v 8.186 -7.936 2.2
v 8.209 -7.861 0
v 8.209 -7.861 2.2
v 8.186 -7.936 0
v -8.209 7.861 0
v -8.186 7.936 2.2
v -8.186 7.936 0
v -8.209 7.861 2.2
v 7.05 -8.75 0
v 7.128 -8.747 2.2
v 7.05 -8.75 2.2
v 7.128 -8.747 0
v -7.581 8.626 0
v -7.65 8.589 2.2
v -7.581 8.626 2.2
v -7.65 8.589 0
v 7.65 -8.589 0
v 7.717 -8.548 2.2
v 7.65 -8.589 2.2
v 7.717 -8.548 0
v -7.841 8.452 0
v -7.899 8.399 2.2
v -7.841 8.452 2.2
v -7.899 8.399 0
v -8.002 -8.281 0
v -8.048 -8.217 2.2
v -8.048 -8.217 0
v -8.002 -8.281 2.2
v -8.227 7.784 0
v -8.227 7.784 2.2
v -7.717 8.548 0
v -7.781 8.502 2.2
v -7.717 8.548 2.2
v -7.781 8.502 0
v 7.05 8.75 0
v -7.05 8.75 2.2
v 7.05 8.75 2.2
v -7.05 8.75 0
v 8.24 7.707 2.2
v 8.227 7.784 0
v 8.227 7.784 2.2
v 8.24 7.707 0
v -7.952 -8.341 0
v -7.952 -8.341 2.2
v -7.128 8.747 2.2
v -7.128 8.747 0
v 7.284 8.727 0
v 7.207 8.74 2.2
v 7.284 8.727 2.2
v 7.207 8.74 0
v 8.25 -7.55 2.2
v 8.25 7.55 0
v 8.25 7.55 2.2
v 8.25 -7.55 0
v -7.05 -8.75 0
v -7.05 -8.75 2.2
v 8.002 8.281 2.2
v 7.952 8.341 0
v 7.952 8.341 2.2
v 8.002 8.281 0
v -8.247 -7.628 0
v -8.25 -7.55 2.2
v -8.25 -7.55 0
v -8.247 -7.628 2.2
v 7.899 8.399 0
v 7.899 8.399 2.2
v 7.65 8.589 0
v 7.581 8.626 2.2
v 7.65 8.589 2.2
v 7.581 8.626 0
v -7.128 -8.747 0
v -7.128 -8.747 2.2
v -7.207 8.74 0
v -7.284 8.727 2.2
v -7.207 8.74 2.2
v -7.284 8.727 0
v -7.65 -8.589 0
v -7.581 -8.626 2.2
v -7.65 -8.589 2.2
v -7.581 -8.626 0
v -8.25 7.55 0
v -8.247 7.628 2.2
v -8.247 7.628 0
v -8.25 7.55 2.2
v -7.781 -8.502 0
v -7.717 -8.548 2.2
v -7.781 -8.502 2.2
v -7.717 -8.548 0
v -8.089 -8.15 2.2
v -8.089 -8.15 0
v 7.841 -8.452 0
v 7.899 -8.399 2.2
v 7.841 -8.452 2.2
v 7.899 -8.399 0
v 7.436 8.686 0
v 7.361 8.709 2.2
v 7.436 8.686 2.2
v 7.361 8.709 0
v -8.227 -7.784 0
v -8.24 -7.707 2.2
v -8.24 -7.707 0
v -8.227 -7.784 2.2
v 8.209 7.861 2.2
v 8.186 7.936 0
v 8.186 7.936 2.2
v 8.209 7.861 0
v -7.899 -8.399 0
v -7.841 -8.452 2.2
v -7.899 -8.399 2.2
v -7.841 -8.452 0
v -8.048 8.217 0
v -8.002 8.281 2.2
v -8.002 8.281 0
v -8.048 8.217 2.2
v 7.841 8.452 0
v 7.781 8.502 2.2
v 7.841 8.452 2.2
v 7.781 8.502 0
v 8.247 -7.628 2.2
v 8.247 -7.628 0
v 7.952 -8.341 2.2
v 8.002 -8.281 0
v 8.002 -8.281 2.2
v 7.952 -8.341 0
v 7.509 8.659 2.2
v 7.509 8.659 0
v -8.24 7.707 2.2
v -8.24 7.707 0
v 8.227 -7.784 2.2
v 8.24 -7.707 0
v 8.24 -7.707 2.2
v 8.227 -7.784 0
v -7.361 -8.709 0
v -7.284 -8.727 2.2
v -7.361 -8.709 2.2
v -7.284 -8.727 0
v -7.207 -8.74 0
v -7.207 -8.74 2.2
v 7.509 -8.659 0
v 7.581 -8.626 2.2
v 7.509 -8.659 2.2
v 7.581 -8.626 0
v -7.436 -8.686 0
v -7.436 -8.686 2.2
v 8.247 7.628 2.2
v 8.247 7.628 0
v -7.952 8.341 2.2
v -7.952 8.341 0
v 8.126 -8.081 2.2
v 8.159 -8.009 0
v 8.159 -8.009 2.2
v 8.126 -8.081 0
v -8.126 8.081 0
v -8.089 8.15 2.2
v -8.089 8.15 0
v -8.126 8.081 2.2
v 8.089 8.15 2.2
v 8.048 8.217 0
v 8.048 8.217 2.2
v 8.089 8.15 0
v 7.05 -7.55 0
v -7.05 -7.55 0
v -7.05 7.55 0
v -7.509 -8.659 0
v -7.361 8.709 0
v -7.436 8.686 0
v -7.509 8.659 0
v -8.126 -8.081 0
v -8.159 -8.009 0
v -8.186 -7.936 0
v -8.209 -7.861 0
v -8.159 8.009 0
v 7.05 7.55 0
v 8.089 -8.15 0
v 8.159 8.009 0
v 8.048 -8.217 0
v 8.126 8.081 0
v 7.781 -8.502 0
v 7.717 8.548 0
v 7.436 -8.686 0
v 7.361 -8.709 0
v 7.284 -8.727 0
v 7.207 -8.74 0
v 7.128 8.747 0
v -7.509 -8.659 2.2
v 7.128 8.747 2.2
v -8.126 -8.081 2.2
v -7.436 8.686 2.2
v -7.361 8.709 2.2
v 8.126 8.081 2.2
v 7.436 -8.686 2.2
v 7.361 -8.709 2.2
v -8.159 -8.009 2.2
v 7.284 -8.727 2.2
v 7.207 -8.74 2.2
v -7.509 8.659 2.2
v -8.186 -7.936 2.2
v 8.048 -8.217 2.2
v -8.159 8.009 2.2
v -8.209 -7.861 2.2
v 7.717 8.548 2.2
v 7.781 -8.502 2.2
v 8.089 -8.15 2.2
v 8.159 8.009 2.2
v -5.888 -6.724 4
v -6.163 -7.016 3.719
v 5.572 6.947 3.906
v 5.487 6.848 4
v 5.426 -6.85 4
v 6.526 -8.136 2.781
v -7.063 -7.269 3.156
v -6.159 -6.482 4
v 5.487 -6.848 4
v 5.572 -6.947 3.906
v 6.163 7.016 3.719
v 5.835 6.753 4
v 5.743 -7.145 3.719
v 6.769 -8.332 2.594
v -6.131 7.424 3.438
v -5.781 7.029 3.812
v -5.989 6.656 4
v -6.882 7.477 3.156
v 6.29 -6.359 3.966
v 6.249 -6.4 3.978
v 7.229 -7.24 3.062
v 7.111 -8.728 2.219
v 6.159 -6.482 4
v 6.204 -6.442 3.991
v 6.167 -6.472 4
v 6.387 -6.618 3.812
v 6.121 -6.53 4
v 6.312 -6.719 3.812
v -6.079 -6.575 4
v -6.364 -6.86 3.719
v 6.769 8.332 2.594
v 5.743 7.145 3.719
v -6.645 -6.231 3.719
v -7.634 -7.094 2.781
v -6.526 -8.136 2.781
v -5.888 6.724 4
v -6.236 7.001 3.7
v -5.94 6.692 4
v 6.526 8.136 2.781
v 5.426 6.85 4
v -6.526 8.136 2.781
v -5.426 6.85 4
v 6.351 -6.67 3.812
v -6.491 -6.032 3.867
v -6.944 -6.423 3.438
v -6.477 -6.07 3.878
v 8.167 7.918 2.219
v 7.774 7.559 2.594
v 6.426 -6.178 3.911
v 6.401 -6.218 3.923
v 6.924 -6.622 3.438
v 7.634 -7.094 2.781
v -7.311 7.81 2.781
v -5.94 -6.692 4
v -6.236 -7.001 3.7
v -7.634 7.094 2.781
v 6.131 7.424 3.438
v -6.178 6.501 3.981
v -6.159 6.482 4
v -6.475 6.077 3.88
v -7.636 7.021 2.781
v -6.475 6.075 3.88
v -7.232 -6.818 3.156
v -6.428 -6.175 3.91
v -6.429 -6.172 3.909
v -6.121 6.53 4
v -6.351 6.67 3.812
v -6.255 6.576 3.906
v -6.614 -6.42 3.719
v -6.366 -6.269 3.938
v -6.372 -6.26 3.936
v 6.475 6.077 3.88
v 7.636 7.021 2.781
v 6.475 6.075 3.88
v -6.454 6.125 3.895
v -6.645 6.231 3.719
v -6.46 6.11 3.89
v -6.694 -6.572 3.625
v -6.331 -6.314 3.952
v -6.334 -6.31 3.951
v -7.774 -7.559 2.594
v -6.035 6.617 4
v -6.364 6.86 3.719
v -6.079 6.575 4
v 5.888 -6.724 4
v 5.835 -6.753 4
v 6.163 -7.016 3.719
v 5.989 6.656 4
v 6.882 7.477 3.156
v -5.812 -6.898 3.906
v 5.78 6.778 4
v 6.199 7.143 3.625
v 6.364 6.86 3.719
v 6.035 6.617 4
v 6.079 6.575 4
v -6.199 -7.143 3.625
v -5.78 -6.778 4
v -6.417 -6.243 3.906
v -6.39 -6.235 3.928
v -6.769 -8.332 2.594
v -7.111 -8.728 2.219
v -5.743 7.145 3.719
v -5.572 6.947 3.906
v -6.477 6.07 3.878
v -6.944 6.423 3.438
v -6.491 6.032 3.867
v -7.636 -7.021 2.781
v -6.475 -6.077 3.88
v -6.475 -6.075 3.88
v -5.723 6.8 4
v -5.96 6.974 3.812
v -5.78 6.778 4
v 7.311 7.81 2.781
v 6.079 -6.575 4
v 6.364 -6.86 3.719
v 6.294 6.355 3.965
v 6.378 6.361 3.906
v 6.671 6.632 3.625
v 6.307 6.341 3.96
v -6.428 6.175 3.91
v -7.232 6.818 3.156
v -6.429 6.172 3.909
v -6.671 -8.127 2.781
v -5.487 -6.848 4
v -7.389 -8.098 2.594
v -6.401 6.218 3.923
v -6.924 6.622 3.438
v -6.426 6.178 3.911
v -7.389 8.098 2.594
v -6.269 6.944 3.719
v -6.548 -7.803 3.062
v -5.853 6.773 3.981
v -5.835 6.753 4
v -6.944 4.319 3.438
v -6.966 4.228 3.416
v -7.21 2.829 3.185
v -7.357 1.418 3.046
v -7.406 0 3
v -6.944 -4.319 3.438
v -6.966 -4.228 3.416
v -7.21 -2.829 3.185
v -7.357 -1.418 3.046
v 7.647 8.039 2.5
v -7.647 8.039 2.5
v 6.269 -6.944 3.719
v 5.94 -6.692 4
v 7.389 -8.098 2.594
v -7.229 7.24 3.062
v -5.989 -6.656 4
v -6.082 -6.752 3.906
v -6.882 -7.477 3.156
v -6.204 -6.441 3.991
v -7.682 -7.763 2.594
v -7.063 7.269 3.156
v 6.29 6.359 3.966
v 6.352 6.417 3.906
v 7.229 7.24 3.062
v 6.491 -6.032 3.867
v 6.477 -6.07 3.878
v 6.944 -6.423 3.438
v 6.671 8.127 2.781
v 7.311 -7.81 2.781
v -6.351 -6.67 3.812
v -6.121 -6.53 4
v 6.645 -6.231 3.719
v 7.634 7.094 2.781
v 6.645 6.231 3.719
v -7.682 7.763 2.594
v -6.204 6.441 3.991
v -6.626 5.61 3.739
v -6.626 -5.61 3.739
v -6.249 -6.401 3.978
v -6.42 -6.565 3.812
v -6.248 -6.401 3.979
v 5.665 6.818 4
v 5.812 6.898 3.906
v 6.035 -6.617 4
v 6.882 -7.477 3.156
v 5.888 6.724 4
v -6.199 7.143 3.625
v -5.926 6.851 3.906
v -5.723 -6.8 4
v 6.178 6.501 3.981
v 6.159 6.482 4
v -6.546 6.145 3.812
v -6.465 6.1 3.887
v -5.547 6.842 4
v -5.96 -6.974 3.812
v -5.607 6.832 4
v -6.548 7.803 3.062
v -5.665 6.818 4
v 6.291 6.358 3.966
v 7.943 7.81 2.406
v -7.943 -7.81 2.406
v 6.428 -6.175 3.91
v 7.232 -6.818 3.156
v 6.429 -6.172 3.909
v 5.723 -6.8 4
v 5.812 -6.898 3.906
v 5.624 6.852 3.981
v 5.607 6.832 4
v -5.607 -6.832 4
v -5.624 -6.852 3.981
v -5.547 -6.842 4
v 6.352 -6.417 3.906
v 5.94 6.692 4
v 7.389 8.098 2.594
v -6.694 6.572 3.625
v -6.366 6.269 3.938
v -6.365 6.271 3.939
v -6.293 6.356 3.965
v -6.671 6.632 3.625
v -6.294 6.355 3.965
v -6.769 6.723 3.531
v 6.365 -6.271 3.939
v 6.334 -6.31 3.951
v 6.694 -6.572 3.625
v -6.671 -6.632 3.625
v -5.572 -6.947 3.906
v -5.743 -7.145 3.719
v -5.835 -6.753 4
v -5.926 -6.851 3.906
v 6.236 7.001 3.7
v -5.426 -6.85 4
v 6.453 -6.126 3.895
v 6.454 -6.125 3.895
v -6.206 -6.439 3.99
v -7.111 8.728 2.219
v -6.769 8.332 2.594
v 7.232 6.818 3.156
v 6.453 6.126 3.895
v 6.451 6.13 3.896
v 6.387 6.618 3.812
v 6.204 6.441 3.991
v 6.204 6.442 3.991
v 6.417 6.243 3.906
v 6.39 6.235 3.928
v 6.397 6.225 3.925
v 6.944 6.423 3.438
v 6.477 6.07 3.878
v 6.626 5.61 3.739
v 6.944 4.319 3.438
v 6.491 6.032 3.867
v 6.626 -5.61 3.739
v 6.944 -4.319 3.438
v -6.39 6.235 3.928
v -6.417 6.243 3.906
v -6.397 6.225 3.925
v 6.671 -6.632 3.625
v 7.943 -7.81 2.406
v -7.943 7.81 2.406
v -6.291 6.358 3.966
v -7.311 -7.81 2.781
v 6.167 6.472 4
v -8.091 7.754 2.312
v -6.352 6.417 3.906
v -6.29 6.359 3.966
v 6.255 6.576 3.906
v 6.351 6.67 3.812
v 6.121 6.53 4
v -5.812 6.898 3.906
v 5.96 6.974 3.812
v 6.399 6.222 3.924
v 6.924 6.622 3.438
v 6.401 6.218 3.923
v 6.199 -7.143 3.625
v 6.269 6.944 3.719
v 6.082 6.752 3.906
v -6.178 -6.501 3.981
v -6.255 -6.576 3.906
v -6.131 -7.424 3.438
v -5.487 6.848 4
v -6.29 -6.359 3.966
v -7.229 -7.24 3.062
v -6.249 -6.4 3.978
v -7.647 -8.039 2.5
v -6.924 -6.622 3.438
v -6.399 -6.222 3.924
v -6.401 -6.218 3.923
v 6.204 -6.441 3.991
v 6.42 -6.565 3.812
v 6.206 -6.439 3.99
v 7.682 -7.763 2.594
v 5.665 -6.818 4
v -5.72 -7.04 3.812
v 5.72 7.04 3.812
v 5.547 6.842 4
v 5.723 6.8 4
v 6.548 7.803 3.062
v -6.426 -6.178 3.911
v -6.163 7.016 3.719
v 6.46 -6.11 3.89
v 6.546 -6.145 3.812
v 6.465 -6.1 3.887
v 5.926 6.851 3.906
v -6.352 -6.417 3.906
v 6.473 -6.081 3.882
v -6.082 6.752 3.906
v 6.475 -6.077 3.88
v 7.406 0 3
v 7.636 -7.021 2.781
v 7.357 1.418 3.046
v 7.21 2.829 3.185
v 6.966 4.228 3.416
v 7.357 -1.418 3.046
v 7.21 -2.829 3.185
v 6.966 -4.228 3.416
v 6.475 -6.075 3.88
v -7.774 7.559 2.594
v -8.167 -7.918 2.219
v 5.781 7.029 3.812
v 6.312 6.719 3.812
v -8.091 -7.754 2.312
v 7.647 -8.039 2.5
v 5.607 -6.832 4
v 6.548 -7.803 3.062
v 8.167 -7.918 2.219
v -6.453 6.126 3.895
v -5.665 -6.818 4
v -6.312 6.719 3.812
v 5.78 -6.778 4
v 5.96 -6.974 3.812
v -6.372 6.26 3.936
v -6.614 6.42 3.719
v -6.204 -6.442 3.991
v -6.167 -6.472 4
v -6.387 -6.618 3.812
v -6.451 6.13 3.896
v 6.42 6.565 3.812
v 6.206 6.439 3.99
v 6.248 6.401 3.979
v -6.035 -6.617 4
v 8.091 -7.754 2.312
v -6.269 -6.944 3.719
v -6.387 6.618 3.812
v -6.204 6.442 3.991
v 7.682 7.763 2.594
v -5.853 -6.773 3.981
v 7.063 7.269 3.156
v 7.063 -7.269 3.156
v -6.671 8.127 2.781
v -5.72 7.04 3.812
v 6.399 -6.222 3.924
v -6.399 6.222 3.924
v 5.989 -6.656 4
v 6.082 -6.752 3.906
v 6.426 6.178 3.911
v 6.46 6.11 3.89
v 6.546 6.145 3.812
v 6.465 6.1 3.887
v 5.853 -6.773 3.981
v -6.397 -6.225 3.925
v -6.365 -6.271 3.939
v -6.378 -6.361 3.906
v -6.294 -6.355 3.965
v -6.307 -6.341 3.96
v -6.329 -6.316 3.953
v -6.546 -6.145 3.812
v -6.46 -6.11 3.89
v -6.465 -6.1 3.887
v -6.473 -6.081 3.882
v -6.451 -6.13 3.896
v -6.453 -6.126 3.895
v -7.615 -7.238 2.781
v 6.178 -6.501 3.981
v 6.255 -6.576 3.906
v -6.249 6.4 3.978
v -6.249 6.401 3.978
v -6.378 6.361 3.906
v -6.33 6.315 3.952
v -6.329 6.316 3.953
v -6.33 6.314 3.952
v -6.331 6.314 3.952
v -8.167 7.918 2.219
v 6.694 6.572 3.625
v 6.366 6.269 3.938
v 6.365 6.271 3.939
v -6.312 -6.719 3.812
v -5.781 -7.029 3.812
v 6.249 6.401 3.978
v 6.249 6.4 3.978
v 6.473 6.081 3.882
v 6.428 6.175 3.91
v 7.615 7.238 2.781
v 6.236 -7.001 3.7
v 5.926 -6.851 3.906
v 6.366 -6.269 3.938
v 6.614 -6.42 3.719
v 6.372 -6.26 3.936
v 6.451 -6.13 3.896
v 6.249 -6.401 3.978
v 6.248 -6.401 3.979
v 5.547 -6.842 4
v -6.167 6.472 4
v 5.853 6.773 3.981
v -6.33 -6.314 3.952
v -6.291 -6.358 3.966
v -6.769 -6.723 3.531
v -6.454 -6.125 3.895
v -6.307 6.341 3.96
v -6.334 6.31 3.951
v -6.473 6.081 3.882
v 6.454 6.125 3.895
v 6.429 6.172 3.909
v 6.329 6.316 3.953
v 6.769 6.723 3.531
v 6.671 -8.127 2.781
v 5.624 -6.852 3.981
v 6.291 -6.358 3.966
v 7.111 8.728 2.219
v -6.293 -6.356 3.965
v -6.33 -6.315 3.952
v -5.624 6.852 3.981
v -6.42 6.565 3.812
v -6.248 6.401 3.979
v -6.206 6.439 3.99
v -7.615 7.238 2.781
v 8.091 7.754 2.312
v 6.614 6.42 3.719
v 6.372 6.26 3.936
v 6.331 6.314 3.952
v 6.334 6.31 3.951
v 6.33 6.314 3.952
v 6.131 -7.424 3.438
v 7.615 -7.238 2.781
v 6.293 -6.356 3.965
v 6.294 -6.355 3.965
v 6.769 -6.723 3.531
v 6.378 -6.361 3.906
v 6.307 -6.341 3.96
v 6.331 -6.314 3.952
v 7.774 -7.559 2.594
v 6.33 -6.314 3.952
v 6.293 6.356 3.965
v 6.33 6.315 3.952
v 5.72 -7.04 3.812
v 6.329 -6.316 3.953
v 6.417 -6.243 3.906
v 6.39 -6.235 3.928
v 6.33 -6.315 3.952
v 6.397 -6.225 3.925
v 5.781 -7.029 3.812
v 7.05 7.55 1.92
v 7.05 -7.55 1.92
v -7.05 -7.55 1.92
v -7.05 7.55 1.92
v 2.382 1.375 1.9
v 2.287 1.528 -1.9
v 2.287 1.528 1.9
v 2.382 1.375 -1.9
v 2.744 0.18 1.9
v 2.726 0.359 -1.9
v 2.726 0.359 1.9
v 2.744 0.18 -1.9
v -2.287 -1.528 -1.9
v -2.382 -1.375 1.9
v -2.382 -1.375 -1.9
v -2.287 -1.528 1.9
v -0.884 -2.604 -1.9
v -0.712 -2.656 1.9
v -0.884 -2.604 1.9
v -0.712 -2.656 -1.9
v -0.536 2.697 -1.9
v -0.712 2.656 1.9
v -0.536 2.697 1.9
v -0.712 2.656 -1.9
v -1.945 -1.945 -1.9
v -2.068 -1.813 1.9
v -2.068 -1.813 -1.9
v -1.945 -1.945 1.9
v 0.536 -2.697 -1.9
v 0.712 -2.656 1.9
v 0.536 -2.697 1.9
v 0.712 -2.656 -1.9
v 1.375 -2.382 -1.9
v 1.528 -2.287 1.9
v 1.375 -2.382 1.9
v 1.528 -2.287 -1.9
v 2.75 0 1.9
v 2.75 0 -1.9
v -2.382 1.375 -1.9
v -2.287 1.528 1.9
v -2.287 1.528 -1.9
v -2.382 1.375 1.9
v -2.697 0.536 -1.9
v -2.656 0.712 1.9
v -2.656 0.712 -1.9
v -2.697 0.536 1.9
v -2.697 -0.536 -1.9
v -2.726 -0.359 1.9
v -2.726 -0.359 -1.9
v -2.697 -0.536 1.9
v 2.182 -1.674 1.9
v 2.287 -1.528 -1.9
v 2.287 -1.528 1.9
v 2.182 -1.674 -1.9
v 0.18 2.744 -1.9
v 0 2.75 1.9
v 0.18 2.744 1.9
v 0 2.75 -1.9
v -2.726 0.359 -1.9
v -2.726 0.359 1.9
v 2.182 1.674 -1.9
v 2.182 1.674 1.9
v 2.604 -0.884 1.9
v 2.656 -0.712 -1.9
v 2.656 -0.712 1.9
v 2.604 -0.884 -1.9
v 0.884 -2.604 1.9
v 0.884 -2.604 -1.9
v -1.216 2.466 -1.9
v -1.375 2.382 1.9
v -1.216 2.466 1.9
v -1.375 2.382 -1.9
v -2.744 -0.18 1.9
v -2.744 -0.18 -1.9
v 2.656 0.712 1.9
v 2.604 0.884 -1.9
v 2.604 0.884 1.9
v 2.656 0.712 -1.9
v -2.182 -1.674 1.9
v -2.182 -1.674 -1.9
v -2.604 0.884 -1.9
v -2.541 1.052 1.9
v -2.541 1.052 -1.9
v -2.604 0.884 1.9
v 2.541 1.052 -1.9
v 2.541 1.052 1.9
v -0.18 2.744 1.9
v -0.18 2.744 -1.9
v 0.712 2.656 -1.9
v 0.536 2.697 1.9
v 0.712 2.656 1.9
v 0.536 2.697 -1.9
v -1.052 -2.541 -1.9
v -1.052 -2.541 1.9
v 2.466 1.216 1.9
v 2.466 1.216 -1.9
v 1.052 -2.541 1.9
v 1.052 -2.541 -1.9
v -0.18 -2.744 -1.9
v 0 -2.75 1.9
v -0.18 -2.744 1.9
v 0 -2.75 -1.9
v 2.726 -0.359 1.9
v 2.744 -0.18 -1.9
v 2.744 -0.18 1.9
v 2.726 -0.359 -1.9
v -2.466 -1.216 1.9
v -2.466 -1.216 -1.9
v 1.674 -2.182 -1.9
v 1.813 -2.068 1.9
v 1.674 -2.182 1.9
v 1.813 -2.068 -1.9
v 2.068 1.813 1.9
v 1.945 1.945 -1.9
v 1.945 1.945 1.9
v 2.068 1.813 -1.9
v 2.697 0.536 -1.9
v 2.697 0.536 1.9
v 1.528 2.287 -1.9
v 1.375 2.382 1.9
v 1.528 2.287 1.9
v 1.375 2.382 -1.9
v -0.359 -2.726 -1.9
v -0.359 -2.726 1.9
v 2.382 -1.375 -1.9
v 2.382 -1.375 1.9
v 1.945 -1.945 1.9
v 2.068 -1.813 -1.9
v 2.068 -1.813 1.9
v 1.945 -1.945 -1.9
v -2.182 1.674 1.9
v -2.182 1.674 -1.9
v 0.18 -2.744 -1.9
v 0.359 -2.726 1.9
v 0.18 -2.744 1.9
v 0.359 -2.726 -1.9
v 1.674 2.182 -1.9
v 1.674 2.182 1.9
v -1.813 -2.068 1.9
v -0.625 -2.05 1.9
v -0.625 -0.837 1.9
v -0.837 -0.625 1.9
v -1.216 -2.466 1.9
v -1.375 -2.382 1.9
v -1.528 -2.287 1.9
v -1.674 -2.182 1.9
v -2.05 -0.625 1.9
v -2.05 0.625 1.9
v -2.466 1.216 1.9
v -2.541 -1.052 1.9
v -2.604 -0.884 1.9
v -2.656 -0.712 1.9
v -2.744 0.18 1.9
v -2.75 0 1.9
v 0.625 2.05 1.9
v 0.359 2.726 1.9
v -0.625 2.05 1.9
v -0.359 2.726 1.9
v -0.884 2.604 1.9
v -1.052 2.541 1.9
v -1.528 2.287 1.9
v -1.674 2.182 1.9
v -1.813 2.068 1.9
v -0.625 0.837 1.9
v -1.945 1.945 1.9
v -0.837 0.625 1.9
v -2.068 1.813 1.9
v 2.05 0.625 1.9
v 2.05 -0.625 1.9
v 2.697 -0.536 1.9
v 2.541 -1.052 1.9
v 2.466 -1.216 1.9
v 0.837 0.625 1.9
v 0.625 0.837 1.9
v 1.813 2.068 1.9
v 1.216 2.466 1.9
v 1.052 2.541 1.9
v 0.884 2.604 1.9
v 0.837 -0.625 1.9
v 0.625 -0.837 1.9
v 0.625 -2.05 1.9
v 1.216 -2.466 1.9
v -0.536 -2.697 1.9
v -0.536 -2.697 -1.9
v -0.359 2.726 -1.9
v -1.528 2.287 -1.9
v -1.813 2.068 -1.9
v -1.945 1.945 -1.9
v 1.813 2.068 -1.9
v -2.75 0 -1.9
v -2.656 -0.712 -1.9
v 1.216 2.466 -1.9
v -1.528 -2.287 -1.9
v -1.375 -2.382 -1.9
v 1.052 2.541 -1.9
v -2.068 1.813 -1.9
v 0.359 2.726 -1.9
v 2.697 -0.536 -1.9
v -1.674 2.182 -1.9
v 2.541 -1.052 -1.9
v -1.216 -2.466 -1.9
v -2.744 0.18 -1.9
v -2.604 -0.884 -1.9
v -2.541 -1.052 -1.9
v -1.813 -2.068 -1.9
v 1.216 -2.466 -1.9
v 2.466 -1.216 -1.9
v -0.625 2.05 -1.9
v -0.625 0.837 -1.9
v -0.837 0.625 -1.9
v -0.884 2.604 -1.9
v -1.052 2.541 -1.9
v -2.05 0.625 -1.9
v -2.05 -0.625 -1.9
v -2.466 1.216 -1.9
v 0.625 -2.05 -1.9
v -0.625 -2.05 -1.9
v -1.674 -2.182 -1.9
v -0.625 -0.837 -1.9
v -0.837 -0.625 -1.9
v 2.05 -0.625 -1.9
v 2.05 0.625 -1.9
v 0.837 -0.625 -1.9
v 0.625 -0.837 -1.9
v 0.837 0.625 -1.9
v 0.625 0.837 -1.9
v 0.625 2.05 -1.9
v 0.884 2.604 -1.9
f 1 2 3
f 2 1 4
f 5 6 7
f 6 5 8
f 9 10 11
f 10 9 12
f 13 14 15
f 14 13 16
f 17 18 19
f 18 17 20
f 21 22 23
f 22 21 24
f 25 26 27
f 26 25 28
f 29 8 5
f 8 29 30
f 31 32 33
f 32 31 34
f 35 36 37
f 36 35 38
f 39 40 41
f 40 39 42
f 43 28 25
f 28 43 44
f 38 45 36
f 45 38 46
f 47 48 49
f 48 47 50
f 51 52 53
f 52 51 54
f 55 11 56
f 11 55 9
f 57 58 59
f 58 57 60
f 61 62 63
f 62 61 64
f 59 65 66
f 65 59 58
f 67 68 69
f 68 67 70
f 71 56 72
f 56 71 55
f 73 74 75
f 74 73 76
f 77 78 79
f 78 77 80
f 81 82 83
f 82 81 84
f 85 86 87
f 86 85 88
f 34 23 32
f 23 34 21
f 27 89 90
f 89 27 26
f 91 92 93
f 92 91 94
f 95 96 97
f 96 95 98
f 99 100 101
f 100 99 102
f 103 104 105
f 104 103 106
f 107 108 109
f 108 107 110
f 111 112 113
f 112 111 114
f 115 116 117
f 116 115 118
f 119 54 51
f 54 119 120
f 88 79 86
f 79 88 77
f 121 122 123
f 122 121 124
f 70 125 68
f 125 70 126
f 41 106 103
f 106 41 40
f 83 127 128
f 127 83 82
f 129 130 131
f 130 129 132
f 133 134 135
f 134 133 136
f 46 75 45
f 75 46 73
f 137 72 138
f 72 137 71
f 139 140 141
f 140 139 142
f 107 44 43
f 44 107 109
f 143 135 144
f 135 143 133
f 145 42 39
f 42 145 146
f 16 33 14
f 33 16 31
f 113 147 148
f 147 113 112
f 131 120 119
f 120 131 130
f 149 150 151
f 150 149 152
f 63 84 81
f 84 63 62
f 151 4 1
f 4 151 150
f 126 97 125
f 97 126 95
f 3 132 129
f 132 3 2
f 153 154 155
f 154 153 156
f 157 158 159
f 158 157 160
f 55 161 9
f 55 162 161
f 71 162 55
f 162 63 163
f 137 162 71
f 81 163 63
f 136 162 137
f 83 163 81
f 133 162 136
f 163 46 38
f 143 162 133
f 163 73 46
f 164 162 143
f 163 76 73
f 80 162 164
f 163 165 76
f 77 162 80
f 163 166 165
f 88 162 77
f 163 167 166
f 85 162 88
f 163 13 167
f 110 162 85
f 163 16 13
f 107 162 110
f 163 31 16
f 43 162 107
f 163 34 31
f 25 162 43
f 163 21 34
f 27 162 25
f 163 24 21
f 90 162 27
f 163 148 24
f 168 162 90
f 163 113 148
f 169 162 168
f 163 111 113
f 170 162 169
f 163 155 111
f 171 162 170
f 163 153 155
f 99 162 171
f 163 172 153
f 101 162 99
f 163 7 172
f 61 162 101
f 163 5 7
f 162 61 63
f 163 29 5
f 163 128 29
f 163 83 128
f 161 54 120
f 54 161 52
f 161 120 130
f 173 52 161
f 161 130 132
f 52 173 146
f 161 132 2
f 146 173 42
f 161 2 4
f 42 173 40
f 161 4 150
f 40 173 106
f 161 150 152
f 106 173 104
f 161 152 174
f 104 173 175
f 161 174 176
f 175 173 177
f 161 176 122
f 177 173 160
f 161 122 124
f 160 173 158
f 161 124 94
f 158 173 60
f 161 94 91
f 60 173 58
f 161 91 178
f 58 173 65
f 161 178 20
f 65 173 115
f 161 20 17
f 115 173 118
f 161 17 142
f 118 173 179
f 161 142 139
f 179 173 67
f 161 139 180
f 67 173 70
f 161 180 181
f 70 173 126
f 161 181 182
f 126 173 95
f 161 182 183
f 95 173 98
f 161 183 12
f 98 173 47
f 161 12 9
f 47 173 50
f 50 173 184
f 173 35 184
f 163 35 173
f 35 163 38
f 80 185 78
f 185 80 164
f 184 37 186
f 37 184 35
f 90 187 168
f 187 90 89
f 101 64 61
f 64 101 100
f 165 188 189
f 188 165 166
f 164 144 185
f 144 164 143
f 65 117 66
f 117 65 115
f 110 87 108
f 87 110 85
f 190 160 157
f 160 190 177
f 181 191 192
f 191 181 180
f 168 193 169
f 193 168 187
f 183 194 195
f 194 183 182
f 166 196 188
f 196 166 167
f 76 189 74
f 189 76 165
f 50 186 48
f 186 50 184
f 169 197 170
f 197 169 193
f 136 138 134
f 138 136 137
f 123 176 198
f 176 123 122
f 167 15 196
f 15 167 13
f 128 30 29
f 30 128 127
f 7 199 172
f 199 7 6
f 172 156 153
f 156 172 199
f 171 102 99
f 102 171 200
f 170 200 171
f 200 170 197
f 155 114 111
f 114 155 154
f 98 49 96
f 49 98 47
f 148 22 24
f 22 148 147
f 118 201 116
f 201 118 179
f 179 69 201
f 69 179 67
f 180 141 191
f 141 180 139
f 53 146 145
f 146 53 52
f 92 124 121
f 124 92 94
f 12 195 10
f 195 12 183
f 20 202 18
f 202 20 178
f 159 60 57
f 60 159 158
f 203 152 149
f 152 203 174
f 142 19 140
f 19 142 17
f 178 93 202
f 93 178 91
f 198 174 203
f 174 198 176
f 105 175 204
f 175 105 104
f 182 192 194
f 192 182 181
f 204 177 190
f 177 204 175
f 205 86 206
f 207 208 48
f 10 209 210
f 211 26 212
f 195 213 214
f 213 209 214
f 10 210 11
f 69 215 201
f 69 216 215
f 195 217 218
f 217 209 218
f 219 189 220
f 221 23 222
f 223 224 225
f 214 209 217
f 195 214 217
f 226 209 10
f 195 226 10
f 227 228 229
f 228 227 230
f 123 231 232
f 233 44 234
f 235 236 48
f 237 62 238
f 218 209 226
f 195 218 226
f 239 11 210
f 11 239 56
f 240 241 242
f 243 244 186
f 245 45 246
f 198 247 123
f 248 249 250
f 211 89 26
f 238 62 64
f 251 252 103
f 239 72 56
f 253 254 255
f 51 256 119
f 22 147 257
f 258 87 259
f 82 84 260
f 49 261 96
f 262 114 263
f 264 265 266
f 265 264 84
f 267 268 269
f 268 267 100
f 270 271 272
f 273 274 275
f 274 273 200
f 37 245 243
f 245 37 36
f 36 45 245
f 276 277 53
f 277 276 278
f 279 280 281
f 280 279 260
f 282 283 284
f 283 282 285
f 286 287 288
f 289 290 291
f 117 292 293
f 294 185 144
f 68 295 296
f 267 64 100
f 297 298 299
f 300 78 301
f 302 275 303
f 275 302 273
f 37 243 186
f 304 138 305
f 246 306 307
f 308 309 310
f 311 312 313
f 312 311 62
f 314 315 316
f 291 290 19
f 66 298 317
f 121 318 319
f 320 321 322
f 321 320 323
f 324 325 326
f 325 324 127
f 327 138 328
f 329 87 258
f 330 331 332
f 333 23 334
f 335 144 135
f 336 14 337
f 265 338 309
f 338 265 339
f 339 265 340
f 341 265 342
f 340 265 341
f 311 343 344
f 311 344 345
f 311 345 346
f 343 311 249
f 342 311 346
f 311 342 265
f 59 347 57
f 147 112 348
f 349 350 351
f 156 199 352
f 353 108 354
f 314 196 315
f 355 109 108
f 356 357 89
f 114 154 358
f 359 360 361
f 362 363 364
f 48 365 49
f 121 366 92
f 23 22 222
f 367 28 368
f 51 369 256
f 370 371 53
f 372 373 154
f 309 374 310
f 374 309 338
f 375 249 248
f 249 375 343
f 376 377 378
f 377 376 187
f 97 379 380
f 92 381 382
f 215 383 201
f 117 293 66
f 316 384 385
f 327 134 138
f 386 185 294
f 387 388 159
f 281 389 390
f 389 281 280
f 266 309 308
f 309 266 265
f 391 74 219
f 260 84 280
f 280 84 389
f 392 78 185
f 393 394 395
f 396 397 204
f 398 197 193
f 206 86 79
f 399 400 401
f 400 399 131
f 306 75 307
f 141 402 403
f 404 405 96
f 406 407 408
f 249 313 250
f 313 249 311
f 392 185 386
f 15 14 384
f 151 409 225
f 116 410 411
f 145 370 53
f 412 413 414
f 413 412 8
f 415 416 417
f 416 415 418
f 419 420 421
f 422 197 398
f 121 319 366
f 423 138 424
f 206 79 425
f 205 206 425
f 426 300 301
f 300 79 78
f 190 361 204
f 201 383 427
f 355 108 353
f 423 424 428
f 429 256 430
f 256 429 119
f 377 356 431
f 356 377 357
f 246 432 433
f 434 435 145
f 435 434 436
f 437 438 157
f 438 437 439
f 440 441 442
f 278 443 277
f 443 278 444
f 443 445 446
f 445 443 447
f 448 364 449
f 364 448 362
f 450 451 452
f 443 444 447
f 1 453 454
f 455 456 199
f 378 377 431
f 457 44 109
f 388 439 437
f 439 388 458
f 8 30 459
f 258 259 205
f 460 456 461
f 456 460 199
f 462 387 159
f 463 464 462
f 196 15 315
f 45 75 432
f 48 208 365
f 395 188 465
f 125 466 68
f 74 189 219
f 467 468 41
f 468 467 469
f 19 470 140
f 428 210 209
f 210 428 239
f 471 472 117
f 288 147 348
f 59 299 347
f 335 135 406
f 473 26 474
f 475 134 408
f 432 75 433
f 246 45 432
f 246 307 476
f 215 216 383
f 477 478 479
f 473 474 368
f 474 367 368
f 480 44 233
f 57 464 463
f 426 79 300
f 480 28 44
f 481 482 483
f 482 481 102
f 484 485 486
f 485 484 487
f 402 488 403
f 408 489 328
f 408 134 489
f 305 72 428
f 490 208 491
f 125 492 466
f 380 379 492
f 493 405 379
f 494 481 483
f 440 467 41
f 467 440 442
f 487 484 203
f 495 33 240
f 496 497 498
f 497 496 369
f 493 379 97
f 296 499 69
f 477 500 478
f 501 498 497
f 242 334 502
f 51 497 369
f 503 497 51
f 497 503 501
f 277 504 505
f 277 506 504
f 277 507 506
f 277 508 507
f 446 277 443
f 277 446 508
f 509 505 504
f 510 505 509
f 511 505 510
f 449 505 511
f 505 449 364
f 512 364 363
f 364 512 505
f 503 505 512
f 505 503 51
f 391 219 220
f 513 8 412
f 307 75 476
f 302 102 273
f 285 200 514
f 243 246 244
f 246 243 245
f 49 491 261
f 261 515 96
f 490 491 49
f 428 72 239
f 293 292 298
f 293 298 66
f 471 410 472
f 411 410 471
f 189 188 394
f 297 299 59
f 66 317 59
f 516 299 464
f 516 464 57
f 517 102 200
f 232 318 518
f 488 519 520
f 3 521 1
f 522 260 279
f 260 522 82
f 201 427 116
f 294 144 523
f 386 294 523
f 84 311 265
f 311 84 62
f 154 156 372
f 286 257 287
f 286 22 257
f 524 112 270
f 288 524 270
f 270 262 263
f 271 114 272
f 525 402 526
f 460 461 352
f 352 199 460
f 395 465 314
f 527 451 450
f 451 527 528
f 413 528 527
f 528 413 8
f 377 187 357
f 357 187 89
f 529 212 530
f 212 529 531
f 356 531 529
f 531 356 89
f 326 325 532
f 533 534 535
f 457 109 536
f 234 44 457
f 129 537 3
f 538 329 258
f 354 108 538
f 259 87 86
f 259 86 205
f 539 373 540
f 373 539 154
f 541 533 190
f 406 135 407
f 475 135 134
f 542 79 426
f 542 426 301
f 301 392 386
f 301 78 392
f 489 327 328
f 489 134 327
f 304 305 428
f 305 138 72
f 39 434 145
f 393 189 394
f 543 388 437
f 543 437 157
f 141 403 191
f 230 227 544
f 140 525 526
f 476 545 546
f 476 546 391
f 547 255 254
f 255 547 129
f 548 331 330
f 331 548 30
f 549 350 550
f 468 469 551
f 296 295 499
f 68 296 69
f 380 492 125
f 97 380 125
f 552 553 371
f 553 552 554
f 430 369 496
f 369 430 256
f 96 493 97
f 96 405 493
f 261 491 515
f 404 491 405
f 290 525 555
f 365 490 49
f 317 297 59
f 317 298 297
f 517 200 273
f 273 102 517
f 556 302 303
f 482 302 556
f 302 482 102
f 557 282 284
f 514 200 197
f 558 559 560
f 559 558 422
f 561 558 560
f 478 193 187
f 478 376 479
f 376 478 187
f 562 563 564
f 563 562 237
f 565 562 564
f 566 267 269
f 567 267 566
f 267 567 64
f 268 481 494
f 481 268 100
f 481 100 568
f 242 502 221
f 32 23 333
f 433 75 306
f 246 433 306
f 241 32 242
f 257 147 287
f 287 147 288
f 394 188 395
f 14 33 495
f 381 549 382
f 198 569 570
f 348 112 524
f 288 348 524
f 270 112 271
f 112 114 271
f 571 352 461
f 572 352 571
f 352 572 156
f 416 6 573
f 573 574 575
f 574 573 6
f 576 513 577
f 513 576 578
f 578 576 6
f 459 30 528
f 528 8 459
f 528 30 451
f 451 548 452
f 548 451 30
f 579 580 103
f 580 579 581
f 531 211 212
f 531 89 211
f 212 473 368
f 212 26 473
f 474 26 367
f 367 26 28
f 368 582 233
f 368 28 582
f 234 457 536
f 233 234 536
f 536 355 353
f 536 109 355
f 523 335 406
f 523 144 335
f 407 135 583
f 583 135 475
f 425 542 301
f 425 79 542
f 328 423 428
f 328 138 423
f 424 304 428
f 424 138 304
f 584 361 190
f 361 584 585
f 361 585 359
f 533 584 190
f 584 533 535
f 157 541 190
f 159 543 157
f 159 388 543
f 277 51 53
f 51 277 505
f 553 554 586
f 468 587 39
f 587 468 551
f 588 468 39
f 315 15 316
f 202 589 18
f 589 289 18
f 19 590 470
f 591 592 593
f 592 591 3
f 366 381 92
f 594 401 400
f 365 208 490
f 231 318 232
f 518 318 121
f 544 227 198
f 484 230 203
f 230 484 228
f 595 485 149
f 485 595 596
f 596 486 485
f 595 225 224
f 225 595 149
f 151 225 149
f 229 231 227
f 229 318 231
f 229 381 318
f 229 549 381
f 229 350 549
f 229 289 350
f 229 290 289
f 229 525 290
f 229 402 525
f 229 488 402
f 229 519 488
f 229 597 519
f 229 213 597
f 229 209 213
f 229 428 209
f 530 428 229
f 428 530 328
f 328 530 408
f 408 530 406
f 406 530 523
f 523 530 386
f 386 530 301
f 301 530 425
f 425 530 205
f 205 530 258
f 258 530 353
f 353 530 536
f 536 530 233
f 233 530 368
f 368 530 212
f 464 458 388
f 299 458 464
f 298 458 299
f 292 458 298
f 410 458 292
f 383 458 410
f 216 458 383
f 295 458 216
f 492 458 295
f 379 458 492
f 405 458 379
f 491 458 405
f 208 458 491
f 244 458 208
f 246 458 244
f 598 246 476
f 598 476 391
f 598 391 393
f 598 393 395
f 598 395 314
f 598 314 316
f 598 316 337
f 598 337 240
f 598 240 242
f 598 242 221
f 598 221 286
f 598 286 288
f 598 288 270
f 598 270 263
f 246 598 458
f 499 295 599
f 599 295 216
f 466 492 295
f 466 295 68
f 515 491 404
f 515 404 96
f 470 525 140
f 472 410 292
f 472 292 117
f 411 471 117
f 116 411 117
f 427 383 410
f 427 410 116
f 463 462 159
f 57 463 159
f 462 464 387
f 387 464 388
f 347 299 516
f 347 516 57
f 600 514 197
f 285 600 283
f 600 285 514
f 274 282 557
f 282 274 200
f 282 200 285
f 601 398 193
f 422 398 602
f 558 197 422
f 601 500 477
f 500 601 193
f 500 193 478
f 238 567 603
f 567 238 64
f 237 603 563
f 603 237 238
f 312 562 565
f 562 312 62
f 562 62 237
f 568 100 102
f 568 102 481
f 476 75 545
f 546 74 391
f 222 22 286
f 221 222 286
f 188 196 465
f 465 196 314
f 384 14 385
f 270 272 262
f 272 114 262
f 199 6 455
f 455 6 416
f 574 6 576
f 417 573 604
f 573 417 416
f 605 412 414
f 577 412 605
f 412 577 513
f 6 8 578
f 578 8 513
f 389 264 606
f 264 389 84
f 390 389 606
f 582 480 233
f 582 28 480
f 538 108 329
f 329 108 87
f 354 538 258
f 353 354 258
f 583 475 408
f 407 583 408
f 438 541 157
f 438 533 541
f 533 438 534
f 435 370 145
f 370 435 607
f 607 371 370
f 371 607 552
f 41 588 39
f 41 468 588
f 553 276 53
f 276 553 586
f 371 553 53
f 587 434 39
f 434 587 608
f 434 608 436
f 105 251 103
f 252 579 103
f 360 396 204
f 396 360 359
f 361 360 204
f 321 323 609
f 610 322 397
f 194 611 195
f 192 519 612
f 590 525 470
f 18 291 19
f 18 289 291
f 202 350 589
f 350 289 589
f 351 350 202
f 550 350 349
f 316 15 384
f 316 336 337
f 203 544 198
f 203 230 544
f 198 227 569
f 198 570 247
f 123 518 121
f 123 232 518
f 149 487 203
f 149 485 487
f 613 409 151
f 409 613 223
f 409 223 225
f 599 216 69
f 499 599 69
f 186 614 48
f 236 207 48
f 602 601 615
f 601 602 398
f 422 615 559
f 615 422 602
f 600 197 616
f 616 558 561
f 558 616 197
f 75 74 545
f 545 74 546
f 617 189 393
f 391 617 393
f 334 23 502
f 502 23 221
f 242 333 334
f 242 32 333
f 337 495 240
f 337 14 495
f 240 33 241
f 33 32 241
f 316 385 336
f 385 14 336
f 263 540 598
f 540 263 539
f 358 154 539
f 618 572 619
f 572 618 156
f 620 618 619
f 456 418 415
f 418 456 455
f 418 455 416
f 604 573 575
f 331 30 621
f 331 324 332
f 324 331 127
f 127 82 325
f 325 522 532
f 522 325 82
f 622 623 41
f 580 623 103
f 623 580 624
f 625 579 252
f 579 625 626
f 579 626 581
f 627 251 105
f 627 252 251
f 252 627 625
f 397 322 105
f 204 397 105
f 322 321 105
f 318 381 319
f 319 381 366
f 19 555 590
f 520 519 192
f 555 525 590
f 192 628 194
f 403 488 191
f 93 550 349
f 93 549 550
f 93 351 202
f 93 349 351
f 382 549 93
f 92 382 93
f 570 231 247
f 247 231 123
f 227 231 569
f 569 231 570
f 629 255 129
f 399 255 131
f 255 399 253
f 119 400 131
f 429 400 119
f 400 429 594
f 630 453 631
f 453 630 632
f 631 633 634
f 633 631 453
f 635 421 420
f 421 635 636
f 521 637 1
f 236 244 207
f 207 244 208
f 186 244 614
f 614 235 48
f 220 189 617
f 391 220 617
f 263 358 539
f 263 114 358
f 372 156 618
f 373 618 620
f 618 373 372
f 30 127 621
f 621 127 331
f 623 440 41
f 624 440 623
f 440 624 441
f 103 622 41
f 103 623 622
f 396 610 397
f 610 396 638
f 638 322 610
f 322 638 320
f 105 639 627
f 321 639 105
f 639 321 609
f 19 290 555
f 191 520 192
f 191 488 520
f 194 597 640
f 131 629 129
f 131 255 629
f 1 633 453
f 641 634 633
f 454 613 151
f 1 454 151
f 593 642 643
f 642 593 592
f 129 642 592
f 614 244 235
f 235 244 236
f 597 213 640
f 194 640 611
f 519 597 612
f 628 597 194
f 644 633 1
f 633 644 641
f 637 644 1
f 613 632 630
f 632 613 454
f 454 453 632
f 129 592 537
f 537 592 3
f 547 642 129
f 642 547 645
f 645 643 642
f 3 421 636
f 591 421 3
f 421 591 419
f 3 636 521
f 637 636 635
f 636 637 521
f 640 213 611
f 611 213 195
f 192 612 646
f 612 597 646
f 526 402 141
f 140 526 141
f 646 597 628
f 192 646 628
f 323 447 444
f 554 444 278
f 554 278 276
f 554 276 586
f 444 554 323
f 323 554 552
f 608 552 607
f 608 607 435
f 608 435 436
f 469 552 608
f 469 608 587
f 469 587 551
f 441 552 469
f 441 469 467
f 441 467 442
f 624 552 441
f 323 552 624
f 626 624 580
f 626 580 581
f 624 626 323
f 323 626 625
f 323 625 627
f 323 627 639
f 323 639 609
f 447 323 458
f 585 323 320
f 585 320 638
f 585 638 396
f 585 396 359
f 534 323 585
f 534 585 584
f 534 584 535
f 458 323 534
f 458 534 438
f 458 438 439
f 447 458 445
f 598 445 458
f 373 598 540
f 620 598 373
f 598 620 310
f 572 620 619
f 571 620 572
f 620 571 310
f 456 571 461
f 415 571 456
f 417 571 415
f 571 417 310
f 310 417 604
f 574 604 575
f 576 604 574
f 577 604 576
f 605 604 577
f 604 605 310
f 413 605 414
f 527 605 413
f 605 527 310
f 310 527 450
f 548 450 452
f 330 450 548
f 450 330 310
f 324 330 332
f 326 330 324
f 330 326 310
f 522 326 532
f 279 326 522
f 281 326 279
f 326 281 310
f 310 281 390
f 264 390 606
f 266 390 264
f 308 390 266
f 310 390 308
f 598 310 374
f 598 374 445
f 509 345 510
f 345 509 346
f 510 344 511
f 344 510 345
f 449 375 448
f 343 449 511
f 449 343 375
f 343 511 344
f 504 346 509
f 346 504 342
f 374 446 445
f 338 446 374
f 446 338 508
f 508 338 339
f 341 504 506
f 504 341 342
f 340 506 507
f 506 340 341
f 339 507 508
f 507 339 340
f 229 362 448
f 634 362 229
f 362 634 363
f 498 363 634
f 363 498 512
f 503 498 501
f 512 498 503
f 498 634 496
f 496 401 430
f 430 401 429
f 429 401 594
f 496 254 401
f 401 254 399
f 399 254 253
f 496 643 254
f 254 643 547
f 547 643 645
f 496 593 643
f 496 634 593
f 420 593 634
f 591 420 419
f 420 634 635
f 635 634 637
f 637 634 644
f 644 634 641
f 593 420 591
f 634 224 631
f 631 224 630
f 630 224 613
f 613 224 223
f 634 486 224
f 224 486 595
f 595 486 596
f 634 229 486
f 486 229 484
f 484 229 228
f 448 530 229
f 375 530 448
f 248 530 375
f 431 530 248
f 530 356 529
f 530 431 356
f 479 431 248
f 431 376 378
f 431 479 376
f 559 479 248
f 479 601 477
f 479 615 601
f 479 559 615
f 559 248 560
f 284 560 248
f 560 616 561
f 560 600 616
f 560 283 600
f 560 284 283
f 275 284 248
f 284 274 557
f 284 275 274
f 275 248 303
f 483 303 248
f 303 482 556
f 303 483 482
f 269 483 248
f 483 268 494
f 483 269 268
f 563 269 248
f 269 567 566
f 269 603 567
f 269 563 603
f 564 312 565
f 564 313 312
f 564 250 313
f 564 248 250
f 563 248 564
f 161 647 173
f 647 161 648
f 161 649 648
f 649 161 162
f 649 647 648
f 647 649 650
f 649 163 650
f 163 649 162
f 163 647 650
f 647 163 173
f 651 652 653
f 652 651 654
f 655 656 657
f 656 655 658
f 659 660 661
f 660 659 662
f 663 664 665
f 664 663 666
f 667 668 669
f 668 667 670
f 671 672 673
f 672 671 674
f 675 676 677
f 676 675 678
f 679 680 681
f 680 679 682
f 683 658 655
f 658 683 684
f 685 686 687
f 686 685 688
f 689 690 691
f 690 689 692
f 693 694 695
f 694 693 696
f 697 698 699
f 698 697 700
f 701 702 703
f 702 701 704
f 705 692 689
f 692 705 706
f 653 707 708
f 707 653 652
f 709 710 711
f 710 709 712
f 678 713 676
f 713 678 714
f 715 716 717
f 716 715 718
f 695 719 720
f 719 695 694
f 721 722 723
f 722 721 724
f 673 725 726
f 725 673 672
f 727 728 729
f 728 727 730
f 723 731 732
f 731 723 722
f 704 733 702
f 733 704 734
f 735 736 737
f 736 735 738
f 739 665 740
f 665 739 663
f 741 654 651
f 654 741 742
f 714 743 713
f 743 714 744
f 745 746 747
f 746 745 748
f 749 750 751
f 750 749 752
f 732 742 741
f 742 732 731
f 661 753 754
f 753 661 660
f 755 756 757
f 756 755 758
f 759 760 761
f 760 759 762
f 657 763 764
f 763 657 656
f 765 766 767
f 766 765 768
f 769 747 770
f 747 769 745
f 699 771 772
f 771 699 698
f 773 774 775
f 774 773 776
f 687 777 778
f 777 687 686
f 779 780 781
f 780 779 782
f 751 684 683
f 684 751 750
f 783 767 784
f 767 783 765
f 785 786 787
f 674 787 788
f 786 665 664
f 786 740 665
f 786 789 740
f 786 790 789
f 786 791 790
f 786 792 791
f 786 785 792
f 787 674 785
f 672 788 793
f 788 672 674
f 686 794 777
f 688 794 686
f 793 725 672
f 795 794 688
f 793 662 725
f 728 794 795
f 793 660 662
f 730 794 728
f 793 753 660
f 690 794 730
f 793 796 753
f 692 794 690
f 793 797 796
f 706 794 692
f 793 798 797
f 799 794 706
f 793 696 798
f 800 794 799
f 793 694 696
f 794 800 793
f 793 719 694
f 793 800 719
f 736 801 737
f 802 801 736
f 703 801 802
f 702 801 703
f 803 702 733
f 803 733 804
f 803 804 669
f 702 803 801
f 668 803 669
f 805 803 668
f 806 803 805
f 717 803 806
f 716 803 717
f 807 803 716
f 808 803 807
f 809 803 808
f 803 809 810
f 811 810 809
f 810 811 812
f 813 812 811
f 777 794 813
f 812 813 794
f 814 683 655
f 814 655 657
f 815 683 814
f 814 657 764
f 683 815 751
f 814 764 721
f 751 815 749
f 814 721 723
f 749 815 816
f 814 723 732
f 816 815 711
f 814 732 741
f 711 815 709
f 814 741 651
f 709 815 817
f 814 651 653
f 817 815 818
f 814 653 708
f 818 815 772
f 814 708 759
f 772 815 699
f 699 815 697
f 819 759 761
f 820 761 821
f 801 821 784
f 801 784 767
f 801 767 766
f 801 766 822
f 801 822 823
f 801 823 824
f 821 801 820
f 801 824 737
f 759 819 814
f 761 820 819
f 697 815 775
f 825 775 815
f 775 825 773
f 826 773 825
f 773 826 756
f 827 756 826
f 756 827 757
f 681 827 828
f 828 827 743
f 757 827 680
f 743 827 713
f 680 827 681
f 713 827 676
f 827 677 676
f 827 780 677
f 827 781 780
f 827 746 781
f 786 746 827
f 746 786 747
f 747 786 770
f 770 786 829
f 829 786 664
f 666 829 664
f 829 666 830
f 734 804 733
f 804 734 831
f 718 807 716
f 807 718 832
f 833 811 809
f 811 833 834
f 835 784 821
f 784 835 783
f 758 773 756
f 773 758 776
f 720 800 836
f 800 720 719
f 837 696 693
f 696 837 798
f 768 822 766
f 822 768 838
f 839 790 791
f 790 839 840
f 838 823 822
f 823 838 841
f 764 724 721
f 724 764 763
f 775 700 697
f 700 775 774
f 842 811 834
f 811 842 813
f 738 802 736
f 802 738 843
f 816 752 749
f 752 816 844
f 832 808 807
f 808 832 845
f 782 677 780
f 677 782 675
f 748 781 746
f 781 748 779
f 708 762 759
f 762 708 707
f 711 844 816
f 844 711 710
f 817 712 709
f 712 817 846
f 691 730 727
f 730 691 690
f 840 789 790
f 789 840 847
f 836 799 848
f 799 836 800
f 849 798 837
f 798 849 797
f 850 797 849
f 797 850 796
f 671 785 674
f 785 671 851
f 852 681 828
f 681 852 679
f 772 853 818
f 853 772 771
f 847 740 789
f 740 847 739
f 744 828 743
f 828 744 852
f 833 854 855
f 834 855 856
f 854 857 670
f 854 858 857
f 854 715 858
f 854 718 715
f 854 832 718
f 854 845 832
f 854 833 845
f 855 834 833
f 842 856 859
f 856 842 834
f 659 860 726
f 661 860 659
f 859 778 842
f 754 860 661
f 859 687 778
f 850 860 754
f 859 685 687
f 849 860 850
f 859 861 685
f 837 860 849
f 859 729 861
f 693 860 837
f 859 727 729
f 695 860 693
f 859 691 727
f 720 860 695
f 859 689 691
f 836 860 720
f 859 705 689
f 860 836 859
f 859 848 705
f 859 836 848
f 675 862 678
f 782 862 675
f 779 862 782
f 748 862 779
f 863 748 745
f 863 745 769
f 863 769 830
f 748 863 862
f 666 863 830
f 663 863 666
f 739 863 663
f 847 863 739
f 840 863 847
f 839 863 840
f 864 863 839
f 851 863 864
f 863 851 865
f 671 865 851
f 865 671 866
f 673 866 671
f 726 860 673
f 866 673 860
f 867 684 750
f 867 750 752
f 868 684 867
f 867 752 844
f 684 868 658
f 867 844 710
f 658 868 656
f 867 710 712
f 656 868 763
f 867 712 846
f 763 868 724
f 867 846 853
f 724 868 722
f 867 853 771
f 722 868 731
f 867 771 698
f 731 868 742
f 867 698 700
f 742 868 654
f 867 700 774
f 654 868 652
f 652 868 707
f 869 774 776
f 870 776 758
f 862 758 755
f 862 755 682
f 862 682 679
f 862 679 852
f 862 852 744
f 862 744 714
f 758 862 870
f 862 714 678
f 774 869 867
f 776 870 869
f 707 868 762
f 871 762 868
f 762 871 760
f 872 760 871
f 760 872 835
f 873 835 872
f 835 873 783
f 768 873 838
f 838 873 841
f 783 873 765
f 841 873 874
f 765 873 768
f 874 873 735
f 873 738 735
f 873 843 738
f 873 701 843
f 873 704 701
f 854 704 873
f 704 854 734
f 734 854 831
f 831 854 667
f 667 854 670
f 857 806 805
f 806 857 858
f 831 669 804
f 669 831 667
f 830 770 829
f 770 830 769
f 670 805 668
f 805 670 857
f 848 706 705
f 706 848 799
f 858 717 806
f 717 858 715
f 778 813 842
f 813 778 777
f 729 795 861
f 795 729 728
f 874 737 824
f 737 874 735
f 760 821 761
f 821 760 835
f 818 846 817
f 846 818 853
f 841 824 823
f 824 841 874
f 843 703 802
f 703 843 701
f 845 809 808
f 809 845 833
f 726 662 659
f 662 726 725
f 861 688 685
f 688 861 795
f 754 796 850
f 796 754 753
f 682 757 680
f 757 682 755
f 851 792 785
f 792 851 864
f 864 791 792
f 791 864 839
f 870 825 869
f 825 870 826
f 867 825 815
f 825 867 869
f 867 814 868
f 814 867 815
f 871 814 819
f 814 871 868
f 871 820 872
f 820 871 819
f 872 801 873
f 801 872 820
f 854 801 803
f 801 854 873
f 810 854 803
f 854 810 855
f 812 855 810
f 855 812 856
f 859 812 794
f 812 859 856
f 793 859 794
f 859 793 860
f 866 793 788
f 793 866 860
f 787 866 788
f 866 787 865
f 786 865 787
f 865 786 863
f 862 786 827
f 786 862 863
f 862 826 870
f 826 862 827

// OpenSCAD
/*
  Low profile Keycap for MX stems inspired by the ZSA Voyager and Taihao THTs.
  Units: mm

  This has been tested with an FDM 3D-Printer (Bambulab A1 mini) with PLA Matte.
  Requires no supports if you print with a brim and place it on one of its fillets 
  (at an angle)
  0.12mm layer-height (incl. initial layer).

  Notes / modeling choices:
  - Outer body is a two-stage extrusion: straight walls up to `side_fillet_start_z`,
    then a gentle taper toward the top “inset” footprint.
  - The “touch surface” concavity is approximated by subtracting a cylinder-shaped dish,
    with ~`dish_depth` sag at the center.
  - MX cross hole is a 2D plus that gets filleted using offset(r) then offset(-r)
*/

$fn = 96;

// -------------------------
// Parameters (grouped)
// -------------------------
/* Keycap footprint */
cap_w            = 16.5;     // X (use different values for oblong)
cap_h            = 17.5;     // Y
cap_corner_r     = 1.2;    // outer corner radius

/* Vertical dimensions */
cap_thickness        = 4.0;   // total height of cap body (cap bottom to top exterior)
wall_thickness       = 1.2;   // keycap underside cavity walls
underside_pocket_z   = 1.9;   // cavity depth from bottom (inside hollow depth)
side_fillet_start_z  = 2.2;   // z where outer “inset/taper” begins

/* Top inset / touch surface shaping */
inset_lr         = 1.9;   // inset on left/right at the very top (X border)
inset_tb         = 1.9;   // inset on top/bottom at the very top (Y border) (your 2mm->1mm feel)
dish_depth       = 1.0;   // concavity depth at center (approx)
dish_span_scale  = 0.95;  // how wide the dish influences (0..1), smaller = more localized

/* Stem (outer post) */
stem_outer_d     = 5.5;   // outer cylinder diameter
stem_total_len   = 3.8;   // total stem length up to the internal “roof” it attaches to
stem_protrude    = 1.9;   // how much stem sticks out below the keycap bottom (also equals pocket depth)

/* MX cross hole - these values are not to spec, but rather to print nicely. */
mx_plus_size     = 4.1;   // overall height/width of plus (across opposite ends)
mx_leg_thick     = 1.25;  // thickness of each leg
mx_inner_fillet  = 0.3;   // fillet radius for inside corners

/* Homing indicator (optional) */
enable_homing    = false;  // set true for F/J
homing_len       = 5.0;   // bar length (X)
homing_w         = 0.7;   // bar width (Y)
homing_h         = 0.5;   // bar height (Z)
homing_offset_x  = -2;    // move bump toward you (negative X) like typical F/J
homing_offset_z  = 1.1;   // move bump into/away from the keycap

// -------------------------
// Helpers
// -------------------------
module rounded_rect_2d(w, h, r) {
  r2 = min(r, min(w,h)/2);
  offset(r=r2) square([w-2*r2, h-2*r2], center=true);
}

module mx_plus_2d(size, leg, fillet_r) {
  // Sharp plus first
  union() {
    union() {
      square([leg, size], center=true);
      square([size, leg], center=true);
    }

    // Add material only in the 4 re-entrant (inside) corners
    // (these are at ±leg/2, ±leg/2). This won’t touch the 8 outer corners.
    for (sx = [-1, 1], sy = [-1, 1]) {
      translate([sx*leg/2, sy*leg/2]) 
        rotate([0,0,45])
          square(fillet_r, center=true);
    }
  }
}


// capsule-ish bar for homing (2D), then extrude
module capsule_2d(len, w) {
  // hull of two circles to make a capsule
  hull() {
    translate([-(len/2 - w/2), 0]) circle(d=w);
    translate([ +(len/2 - w/2), 0]) circle(d=w);
  }
}

// -------------------------
// Main model
// -------------------------
module keycap_body() {
  // bottom footprint
  base_w = cap_w;
  base_h = cap_h;

  // top footprint (inset)
  top_w  = max(0.1, cap_w - 2*inset_tb);
  top_h  = max(0.1, cap_h - 2*inset_lr);

  // scale factors for the upper taper
  sx = top_w / base_w;
  sy = top_h / base_h;

  lower_h = min(side_fillet_start_z, cap_thickness);
  upper_h = max(0, cap_thickness - lower_h);

  union() {
    // lower straight section
    linear_extrude(height=lower_h)
      rounded_rect_2d(base_w, base_h, cap_corner_r);

    // upper tapered section
    if (upper_h > 0.0001)
      translate([0,0,lower_h])
        linear_extrude(height=upper_h, scale=[sx, sy])
          rounded_rect_2d(base_w, base_h, cap_corner_r);
  }
}

module underside_pocket() {
  // cavity is a rounded rectangle inset by wall thickness
  inner_w = cap_w - 2*wall_thickness;
  inner_h = cap_h - 2*wall_thickness;
  inner_r = max(0, cap_corner_r - wall_thickness);

  // pocket cut from the bottom upward
  translate([0,0,0])
    linear_extrude(height=underside_pocket_z + 0.02)  // tiny extra to avoid z-fighting
      rounded_rect_2d(inner_w, inner_h, inner_r);
}

// concave dish made with a cylinder (axis along X)
module concave_dish_cut() {
  // cylinder gives curvature in Y, leaving X mostly "flat"
  top_h = max(0.1, cap_h - 2*inset_lr);

  a = dish_span_scale * top_h / 2; // half-chord in Y
  h = dish_depth;                  // sagitta (depth)

  // R = (a^2 + h^2)/(2h)
  R = (a*a + h*h) / (2*h);

  // place cylinder so that it cuts depth ~h at center on the top surface.
  // for a cylinder, the surface at y=0 sits at z = zc - R, so set that to cap_thickness - h.
  zc = (cap_thickness - h) + R;

  intersection() {
    translate([0,0,zc])
      rotate([0,90,0])  // axis along X
        cylinder(r=R, h=cap_w*3, center=true);

    // bounding box around the top region
    translate([0,0,cap_thickness - 3*h])
      cube([cap_w*2, cap_h*2, 6*h], center=true);
  }
}


// stem placement and extrude it to connect to keycap hull
module stem_post_with_mx_hole() {
  // force stem top to meet the "roof" (top of the underside pocket) at z = underside_pocket_z
  z1 = underside_pocket_z;
  z0 = z1 - stem_total_len;

  difference() {
    translate([0,0,z0])
      cylinder(d=stem_outer_d, h=stem_total_len);

    translate([0,0,z0 - 0.2])
      linear_extrude(height=stem_total_len + 0.4)
        mx_plus_2d(mx_plus_size, mx_leg_thick, mx_inner_fillet);
  }
}


module homing_bump() {
  if (enable_homing) {
    // put it on the top surface, slightly sunk into the dish cut region.
    translate([homing_offset_x, 0, cap_thickness - homing_offset_z])
      rotate([0, 0, 90])
      linear_extrude(height=homing_h)
        capsule_2d(homing_len, homing_w);
  }
}

module low_profile_xm_keycap() {
    union() {
      difference() {
        // main cap shell (solid, then we hollow it)
        keycap_body();
        
        // underside hollow pocket
        underside_pocket();

        // concave touch dish (top shaping)
        concave_dish_cut();
      }
      // stem post attached to the inside roof (top of pocket)
      stem_post_with_mx_hole();

      // optional homing bump 
      homing_bump();
    }
  
}

// -------------------------
// Render
// -------------------------
low_profile_xm_keycap();
